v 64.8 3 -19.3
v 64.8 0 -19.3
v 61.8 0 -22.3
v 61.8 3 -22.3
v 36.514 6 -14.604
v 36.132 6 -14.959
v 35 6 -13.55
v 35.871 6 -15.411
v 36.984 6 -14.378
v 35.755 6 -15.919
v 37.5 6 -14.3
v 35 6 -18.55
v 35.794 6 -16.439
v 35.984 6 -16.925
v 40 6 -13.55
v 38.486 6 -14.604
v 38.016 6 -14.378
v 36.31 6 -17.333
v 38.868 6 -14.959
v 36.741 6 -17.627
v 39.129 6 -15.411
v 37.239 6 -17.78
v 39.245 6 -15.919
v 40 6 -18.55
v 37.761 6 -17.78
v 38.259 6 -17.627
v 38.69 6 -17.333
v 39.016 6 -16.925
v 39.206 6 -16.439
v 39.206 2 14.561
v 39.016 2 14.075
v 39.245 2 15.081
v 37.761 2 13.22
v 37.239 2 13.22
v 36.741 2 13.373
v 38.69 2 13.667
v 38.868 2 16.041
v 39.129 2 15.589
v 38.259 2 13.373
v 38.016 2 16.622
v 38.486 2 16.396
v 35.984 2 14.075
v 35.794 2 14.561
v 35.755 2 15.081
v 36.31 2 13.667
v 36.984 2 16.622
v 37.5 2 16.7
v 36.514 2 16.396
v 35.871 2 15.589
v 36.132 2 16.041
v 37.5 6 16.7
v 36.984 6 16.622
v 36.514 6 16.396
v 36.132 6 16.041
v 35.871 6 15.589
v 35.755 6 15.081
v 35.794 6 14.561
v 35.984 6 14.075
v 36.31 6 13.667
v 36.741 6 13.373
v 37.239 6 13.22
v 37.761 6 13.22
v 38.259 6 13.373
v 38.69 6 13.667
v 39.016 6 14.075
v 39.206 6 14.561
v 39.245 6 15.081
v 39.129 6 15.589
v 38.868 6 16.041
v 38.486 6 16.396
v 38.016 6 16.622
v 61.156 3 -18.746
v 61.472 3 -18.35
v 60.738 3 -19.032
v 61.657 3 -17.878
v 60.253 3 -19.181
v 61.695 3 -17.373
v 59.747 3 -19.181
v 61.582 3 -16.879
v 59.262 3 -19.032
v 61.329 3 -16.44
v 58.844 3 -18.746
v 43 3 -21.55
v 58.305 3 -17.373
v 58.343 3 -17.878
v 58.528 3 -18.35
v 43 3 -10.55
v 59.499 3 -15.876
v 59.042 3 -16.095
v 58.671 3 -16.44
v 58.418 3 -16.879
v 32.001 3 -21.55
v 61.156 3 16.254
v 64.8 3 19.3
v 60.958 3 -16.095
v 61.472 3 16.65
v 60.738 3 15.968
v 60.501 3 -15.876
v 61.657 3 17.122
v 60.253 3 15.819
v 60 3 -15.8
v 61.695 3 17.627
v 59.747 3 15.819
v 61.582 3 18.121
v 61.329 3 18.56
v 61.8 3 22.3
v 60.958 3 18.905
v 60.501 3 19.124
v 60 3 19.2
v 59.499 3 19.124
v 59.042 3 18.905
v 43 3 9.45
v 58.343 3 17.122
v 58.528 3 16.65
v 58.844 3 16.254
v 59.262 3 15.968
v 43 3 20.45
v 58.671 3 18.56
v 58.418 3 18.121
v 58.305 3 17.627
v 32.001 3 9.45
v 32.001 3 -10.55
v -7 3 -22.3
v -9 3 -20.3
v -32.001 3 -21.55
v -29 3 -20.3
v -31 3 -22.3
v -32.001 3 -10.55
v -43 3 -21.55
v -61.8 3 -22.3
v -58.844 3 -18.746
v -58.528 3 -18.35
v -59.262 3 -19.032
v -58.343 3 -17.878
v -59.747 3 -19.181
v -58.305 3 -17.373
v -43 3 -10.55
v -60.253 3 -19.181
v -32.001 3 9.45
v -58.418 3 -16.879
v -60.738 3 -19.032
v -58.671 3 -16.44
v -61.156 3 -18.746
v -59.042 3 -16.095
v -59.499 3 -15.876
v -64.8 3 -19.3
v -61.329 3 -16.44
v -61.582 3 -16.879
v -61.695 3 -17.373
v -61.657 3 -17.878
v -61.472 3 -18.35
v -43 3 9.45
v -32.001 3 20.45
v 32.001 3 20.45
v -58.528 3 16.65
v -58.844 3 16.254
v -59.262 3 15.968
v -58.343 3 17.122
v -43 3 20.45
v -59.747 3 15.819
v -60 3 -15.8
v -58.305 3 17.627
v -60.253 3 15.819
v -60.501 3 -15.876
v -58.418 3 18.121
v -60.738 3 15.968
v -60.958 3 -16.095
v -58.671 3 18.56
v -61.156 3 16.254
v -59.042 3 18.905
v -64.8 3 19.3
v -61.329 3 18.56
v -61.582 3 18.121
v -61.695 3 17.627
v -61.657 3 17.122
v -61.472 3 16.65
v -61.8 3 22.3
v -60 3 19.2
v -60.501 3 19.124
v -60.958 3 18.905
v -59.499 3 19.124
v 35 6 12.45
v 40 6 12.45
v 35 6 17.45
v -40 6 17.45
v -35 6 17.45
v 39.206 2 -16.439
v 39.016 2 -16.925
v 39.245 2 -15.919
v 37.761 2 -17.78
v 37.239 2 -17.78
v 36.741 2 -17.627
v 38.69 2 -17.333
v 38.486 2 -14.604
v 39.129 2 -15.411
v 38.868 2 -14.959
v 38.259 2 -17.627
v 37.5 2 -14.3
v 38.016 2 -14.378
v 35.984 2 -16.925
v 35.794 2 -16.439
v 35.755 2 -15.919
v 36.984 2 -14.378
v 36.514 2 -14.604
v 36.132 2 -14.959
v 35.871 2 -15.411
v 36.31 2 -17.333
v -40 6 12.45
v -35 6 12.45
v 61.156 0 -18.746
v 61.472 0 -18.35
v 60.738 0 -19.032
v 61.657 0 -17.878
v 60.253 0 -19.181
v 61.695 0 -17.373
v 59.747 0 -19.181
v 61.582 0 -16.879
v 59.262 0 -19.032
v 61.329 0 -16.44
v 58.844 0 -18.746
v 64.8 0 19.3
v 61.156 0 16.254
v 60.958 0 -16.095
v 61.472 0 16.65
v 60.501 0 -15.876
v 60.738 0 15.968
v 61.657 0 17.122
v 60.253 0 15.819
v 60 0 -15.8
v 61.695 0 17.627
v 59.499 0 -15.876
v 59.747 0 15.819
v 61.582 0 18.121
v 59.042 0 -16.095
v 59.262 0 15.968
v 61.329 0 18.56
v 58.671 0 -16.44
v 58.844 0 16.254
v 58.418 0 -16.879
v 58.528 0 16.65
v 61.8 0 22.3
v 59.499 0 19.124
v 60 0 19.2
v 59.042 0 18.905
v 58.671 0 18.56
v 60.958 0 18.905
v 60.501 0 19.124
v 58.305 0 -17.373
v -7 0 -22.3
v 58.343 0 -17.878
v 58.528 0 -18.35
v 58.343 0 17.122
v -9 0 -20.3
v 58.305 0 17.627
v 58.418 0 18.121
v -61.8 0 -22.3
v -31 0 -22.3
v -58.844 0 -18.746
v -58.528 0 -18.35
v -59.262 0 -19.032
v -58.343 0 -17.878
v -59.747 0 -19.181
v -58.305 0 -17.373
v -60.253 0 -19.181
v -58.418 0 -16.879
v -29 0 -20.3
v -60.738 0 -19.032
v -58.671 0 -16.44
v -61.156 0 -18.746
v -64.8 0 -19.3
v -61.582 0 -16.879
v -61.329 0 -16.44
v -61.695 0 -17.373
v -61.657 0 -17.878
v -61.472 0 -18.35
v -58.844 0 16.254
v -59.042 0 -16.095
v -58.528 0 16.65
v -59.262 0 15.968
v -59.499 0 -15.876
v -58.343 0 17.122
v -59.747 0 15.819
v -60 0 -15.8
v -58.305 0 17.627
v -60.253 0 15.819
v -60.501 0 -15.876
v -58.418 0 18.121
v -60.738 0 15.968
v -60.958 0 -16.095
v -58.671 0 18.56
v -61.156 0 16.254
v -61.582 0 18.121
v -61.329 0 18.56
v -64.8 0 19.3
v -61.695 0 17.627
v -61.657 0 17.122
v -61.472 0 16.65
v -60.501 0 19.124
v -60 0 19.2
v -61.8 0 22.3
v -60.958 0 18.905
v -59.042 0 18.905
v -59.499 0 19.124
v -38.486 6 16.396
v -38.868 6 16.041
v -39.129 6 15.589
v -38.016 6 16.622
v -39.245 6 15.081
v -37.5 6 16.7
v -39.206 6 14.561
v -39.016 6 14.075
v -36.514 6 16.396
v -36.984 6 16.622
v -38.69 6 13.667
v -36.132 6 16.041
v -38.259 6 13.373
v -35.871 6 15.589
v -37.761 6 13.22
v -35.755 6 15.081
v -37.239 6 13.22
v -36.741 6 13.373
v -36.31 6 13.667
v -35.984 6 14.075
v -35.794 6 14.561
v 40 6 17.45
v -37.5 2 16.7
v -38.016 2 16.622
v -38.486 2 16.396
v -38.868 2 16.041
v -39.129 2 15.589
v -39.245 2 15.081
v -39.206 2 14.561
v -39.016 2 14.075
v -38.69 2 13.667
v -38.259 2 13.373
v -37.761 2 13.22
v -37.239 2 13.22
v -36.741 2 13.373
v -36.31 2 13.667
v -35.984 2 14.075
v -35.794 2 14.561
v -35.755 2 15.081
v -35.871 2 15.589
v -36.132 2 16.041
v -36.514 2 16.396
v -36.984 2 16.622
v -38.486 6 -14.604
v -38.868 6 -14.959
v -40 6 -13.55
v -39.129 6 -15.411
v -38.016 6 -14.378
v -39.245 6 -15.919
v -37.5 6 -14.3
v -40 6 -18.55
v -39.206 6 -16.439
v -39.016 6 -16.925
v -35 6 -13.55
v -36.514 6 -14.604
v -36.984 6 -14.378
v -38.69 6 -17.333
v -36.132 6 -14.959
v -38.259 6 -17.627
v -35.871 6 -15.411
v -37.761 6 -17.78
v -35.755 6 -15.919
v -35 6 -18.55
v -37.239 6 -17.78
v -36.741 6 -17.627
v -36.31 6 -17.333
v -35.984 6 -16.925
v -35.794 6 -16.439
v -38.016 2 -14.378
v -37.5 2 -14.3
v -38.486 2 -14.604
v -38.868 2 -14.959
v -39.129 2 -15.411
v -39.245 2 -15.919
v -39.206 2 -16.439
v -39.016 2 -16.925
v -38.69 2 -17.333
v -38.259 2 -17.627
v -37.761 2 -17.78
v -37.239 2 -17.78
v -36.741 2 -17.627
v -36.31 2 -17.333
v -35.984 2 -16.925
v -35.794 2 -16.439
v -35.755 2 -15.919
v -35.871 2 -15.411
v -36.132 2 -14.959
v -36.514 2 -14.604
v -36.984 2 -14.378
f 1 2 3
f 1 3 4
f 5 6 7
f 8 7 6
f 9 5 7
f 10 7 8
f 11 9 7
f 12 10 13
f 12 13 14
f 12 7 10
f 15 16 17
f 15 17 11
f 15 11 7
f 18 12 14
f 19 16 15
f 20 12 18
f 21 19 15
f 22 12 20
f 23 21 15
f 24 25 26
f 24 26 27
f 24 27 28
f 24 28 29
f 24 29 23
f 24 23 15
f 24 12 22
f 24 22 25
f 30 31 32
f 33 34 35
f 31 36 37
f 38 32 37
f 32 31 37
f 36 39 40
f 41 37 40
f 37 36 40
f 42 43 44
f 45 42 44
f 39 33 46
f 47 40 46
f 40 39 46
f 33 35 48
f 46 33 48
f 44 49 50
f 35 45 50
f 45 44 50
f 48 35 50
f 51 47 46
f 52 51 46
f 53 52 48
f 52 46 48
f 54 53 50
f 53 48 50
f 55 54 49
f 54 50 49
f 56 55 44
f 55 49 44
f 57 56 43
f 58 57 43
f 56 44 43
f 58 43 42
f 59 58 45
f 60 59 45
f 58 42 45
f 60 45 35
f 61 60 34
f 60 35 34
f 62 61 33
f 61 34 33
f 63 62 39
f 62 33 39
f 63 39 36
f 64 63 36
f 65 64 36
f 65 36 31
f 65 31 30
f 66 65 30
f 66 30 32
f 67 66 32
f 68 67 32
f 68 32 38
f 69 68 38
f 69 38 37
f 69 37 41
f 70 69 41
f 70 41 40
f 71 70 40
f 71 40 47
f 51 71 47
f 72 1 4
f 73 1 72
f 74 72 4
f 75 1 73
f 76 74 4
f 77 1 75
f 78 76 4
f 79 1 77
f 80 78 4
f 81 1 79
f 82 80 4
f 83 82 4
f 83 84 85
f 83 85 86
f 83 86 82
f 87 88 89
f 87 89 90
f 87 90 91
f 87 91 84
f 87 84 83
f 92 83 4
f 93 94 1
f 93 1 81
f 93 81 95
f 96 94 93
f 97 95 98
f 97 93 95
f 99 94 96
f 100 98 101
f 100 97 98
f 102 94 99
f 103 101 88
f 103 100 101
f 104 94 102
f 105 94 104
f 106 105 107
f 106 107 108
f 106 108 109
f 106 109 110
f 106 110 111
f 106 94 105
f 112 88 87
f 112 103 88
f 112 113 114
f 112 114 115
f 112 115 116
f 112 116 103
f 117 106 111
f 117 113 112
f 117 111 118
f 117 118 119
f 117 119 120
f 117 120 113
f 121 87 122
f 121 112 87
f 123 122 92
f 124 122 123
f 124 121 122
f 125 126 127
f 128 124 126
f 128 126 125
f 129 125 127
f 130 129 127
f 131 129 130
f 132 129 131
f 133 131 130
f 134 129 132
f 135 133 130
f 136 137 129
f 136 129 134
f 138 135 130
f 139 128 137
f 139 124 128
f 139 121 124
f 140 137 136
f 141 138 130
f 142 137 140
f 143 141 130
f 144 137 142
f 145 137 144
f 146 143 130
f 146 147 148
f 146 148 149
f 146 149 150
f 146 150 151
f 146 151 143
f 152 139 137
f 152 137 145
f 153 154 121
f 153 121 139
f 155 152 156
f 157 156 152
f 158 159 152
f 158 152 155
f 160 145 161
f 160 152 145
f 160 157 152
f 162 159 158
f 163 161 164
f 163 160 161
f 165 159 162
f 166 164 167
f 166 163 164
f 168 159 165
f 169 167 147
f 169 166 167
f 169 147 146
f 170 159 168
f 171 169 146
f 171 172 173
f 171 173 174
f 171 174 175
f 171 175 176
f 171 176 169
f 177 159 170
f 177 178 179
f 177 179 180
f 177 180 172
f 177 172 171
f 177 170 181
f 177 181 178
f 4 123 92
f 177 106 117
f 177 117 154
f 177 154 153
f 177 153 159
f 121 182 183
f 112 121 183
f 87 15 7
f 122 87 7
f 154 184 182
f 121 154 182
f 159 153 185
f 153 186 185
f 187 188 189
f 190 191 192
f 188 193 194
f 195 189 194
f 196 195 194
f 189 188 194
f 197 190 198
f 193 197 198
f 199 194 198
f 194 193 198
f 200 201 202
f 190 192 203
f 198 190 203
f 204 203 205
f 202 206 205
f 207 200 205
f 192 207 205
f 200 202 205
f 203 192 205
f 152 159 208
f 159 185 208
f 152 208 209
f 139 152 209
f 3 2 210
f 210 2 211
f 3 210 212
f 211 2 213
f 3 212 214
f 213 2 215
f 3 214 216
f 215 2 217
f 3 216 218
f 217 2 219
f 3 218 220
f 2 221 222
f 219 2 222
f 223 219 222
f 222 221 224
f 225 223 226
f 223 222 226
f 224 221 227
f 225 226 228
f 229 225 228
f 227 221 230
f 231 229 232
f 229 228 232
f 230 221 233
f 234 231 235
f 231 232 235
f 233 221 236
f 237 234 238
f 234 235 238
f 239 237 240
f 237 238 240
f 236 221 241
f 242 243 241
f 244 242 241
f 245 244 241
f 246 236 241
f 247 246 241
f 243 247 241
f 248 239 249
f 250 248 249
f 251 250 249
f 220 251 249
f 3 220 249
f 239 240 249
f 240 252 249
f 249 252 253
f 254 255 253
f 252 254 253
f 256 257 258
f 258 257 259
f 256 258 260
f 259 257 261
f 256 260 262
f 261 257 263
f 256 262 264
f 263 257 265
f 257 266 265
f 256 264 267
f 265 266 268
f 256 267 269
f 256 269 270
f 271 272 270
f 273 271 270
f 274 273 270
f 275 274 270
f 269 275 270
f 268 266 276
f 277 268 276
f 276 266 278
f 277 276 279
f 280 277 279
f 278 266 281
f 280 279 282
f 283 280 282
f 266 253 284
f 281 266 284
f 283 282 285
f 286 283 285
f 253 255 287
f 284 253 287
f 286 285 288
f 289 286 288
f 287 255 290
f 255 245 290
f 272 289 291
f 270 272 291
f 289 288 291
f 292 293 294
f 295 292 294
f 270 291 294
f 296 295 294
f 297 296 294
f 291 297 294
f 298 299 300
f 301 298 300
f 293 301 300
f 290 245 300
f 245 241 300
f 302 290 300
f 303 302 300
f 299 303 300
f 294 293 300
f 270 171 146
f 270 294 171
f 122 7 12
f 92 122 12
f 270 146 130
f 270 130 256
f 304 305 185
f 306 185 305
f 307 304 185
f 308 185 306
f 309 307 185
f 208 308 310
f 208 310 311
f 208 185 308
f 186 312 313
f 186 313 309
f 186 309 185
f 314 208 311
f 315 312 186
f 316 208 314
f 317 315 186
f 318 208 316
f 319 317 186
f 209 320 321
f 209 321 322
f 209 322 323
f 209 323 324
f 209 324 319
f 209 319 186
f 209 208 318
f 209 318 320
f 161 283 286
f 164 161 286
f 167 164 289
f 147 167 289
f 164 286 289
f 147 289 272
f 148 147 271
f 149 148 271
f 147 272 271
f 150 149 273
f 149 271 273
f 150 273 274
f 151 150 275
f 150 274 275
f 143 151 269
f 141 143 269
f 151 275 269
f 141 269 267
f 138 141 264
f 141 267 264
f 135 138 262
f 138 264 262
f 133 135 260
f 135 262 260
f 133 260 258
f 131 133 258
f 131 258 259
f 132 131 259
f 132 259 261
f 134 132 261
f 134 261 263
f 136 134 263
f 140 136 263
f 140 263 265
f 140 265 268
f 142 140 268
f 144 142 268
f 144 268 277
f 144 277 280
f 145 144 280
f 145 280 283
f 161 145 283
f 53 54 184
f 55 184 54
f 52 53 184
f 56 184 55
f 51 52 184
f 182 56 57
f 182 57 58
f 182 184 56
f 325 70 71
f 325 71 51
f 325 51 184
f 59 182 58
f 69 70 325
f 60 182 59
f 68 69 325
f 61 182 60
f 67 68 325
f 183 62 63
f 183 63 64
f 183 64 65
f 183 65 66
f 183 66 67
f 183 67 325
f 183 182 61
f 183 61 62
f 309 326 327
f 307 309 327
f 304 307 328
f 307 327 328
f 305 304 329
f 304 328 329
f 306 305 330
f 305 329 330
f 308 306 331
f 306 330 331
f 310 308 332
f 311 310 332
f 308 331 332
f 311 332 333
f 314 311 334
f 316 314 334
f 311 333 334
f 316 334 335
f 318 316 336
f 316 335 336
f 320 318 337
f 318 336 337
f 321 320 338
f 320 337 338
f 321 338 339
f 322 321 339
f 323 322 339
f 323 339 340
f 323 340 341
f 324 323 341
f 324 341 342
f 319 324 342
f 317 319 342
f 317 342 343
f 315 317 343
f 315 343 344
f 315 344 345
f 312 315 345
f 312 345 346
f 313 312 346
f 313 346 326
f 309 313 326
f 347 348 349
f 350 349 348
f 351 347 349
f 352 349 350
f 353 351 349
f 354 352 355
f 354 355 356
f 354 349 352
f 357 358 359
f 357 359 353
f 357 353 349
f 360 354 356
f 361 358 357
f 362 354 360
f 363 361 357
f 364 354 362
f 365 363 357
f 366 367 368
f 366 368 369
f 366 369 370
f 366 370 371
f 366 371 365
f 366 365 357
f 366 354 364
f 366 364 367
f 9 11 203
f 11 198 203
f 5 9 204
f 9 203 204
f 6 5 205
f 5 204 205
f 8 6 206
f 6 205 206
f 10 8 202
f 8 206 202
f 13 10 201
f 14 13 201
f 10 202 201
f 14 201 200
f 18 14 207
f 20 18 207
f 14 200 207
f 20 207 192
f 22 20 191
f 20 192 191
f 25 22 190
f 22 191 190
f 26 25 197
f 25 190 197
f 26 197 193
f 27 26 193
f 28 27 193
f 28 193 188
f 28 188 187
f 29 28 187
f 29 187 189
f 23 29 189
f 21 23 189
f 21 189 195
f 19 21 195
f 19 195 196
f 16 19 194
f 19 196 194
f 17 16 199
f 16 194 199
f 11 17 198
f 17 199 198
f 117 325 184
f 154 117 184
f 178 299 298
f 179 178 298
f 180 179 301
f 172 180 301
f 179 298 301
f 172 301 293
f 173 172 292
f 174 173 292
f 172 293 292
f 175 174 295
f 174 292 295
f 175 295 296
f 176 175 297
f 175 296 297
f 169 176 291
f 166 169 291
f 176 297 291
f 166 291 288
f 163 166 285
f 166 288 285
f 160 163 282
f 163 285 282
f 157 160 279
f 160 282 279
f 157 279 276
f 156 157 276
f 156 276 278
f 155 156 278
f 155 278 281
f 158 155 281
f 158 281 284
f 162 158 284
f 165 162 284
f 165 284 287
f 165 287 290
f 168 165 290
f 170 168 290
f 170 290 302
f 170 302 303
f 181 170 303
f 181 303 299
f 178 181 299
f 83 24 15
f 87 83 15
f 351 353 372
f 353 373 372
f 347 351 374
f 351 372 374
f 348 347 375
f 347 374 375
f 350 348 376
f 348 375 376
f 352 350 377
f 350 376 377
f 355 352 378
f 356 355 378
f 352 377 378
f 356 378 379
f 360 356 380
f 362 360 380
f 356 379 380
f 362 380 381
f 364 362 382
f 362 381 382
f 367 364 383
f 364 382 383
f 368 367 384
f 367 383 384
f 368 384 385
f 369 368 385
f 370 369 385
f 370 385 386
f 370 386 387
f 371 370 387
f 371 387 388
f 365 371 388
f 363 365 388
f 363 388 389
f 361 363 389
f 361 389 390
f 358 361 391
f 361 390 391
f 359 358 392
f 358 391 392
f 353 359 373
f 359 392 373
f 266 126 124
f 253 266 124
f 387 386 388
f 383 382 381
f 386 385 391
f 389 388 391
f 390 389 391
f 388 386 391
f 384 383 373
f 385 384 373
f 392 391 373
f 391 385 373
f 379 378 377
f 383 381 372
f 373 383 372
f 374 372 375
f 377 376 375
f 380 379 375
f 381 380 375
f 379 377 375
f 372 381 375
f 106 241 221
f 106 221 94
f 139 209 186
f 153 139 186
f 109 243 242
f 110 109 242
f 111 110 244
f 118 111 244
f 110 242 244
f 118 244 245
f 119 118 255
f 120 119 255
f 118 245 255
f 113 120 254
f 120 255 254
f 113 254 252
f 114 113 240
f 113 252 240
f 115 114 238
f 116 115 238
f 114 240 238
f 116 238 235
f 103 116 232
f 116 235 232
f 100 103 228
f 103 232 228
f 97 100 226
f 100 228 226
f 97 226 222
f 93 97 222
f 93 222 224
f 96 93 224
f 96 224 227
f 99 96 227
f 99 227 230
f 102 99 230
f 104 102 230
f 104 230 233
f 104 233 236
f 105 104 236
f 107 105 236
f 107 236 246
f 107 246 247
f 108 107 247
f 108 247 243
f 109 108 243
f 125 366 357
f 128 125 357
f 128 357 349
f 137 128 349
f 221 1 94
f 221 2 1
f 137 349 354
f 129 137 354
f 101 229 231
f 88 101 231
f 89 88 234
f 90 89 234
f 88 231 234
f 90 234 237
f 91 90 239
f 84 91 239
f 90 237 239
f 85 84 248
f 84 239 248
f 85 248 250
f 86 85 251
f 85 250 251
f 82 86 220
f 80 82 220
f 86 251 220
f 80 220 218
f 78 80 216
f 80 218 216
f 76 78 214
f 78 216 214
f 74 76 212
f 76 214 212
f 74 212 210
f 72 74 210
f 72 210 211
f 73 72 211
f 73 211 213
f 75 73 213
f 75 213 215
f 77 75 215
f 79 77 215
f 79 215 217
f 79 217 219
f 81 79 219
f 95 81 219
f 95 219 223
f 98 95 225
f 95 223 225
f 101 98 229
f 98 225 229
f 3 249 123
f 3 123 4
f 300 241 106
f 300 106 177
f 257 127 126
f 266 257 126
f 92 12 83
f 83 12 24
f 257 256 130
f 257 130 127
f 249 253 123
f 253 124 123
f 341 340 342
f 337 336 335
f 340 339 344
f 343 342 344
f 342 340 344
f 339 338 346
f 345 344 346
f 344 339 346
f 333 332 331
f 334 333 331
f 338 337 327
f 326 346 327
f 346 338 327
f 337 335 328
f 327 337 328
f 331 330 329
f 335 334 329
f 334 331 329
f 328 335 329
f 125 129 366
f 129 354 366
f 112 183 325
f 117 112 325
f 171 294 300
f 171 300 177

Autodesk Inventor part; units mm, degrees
ref_plane "YZ Plane" through (0, 0, 0) normal (1, 0, 0) x (0, 1, 0)
ref_plane "XZ Plane" through (0, 0, 0) normal (0, 1, 0) x (-1, 0, 0)
ref_plane "XY Plane" through (0, 0, 0) normal (0, 0, 1) x (1, 0, 0)
sketch "Sketch1" plane through (0, 0, 0) normal (0, 1, 0) x (-1, 0, 0)
  line L0 (64.8, -22.3) -> (-64.8, -22.3)
  line L1 (-64.8, -22.3) -> (-64.8, 22.3)
  line L2 (-64.8, 22.3) -> (64.8, 22.3)
  line L3 (64.8, 22.3) -> (64.8, -22.3)
  point P0 (0, 0)
  point P1 (64.8, 0)
  point P2 (0, -22.3)
  dimension "d0" = 129.6
  dimension "d1" = 44.6
extrude "Extrusion1" add sketch "Sketch1" along normal blind 3
sketch "Sketch2" plane through (0, 3, 0) normal (0, 1, 0) x (1, 0, 0)
  line L0 (-64.8, -22.3) -> (64.8, -22.3) construction
  line L1 (64.8, -22.3) -> (64.8, 22.3) construction
  line L2 (64.8, 22.3) -> (-64.8, 22.3) construction
  line L3 (-64.8, 22.3) -> (-64.8, -22.3) construction
  line L4 (-40, 18.55) -> (40, 18.55) construction
  line L5 (40, 18.55) -> (40, -17.45) construction
  line L6 (40, -17.45) -> (-40, -17.45) construction
  line L7 (-40, -17.45) -> (-40, 18.55) construction
  circle A0 centre (-37.5, 16.05) radius 1.25 construction
  circle A1 centre (37.5, 16.05) radius 1.25 construction
  circle A2 centre (37.5, -14.95) radius 1.25 construction
  circle A3 centre (-37.5, -14.95) radius 1.25 construction
  line L8 (-37.5, 12.5) -> (37.5, 12.5) construction
  line L9 (37.5, 12.5) -> (37.5, -12.5) construction
  line L10 (37.5, -12.5) -> (-37.5, -12.5) construction
  line L11 (-37.5, -12.5) -> (-37.5, 12.5) construction
  line L12 (-40, 18.55) -> (-35, 18.55)
  line L13 (-35, 18.55) -> (-35, 13.55)
  line L14 (-35, 13.55) -> (-40, 13.55)
  line L15 (-40, 13.55) -> (-40, 18.55)
  line L16 (-40, 18.55) -> (-35, 13.55) construction
  line L17 (-35, 18.55) -> (-40, 13.55) construction
  line L18 (35, 18.55) -> (40, 18.55)
  line L19 (40, 18.55) -> (40, 13.55)
  line L20 (40, 13.55) -> (35, 13.55)
  line L21 (35, 13.55) -> (35, 18.55)
  line L22 (35, 18.55) -> (40, 13.55) construction
  line L23 (40, 18.55) -> (35, 13.55) construction
  line L24 (35, -12.45) -> (40, -12.45)
  line L25 (40, -12.45) -> (40, -17.45)
  line L26 (40, -17.45) -> (35, -17.45)
  line L27 (35, -17.45) -> (35, -12.45)
  line L28 (35, -12.45) -> (40, -17.45) construction
  line L29 (40, -12.45) -> (35, -17.45) construction
  line L30 (-40, -12.45) -> (-35, -12.45)
  line L31 (-35, -12.45) -> (-35, -17.45)
  line L32 (-35, -17.45) -> (-40, -17.45)
  line L33 (-40, -17.45) -> (-40, -12.45)
  line L34 (-40, -12.45) -> (-35, -17.45) construction
  line L35 (-35, -12.45) -> (-40, -17.45) construction
  point P0 (0, 0)
  point P1 (0, 12.5)
  point P2 (0, 22.3)
  dimension "d4" = 80
  dimension "d5" = 36
  dimension "d6" = 2.5
  dimension "d7" = 2.5
  dimension "d8" = 2.5
  dimension "d9" = 2.5
  dimension "d10" = 2.5
  dimension "d12" = 75
  dimension "d13" = 25
  dimension "d14" = 2.5
  dimension "d15" = 4.95
  dimension "d16" = 9.8
  dimension "d17" = 5
extrude "Extrusion2" add sketch "Sketch2" along normal blind 3
sketch "Sketch3" plane through (0, 6, 0) normal (0, 1, 0) x (1, 0, 0)
  line L0 (-35, 18.55) -> (-40, 13.55) construction
  point P0 (0, 0)
  point P1 (-37.5, -14.95)
  point P2 (-37.5, 16.05)
  point P3 (37.5, 16.05)
  point P4 (37.5, -14.95)
hole "Hole1" at (-37.5, 6, 14.95) at (-37.5, 6, -16.05) at (37.5, 6, -16.05) at (37.5, 6, 14.95) direction (0, -1, 0) diameter 3.5 depth 4
chamfer "Chamfer1" distance 3 angle 45 16 edges at (-37.5, 3, -13.55) (-40, 3, -16.05) (-37.5, 3, -18.55) (-35, 3, -16.05) (-37.5, 3, 12.45) (-40, 3, 14.95) (-37.5, 3, 17.45) (-35, 3, 14.95) (37.5, 3, -13.55) (35, 3, -16.05) (37.5, 3, -18.55) (40, 3, -16.05) (37.5, 3, 12.45) (35, 3, 14.95) (37.5, 3, 17.45) (40, 3, 14.95)
sketch "Sketch4" plane through (0, 3, 0) normal (0, 1, 0) x (1, 0, 0)
  line L0 (43, 10.55) -> (43, 21.55) construction
  line L1 (32, 10.55) -> (43, 10.55) construction
  line L2 (32, 21.55) -> (32, 10.55) construction
  line L3 (43, 21.55) -> (32, 21.55) construction
  line L4 (-32, 10.55) -> (-32, 21.55) construction
  line L5 (-43, 10.55) -> (-32, 10.55) construction
  line L6 (-43, 21.55) -> (-43, 10.55) construction
  line L7 (-32, 21.55) -> (-43, 21.55) construction
  line L8 (-64.8, -22.3) -> (64.8, -22.3) construction
  line L9 (64.8, -22.3) -> (64.8, 22.3) construction
  line L10 (64.8, 22.3) -> (-64.8, 22.3) construction
  line L11 (-64.8, 22.3) -> (-64.8, -22.3) construction
  line L12 (-43, -9.45) -> (-43, -20.45) construction
  line L13 (-32, -9.45) -> (-43, -9.45) construction
  line L14 (-32, -20.45) -> (-32, -9.45) construction
  line L15 (-43, -20.45) -> (-32, -20.45) construction
  line L16 (32, -9.45) -> (32, -20.45) construction
  line L17 (43, -9.45) -> (32, -9.45) construction
  line L18 (43, -20.45) -> (43, -9.45) construction
  line L19 (32, -20.45) -> (43, -20.45) construction
  line L20 (64.8, 22.3) -> (-64.8, 22.3) construction
  line L21 (-31, 22.3) -> (-29, 20.3)
  line L22 (-29, 20.3) -> (-9, 20.3)
  line L23 (-9, 20.3) -> (-7, 22.3)
  line L24 (-31, 22.3) -> (-7, 22.3)
  point P0 (0, 0)
  dimension "d31" = 2
  dimension "d32" = 20
  dimension "d33" = 135
  dimension "d34" = 135
  dimension "d35" = 1
extrude "Extrusion3" cut sketch "Sketch4" against normal blind 3
chamfer "Chamfer2" distance 3 angle 45 4 edges at (-64.8, 1.5, -22.3) (-64.8, 1.5, 22.3) (64.8, 1.5, 22.3) (64.8, 1.5, -22.3)
sketch "Sketch5" plane through (0, 3, 0) normal (0, 1, 0) x (1, 0, 0)
  line L0 (43, 10.55) -> (43, 21.55) construction
  line L1 (32, 10.55) -> (43, 10.55) construction
  line L2 (32, 21.55) -> (32, 10.55) construction
  line L3 (43, 21.55) -> (32, 21.55) construction
  line L4 (-32, 10.55) -> (-32, 21.55) construction
  line L5 (-43, 10.55) -> (-32, 10.55) construction
  line L6 (-43, 21.55) -> (-43, 10.55) construction
  line L7 (-32, 21.55) -> (-43, 21.55) construction
  line L8 (-43, -9.45) -> (-43, -20.45) construction
  line L9 (-32, -9.45) -> (-43, -9.45) construction
  line L10 (-32, -20.45) -> (-32, -9.45) construction
  line L11 (-43, -20.45) -> (-32, -20.45) construction
  line L12 (32, -9.45) -> (32, -20.45) construction
  line L13 (43, -9.45) -> (32, -9.45) construction
  line L14 (43, -20.45) -> (43, -9.45) construction
  line L15 (32, -20.45) -> (43, -20.45) construction
  line L16 (61.8, 22.3) -> (64.8, 19.3) construction
  line L17 (61.8, 22.3) -> (-7, 22.3) construction
  line L18 (-7, 22.3) -> (-9, 20.3) construction
  line L19 (-9, 20.3) -> (-29, 20.3) construction
  line L20 (-29, 20.3) -> (-31, 22.3) construction
  line L21 (-31, 22.3) -> (-61.8, 22.3) construction
  line L22 (-64.8, 19.3) -> (-61.8, 22.3) construction
  line L23 (-64.8, 19.3) -> (-64.8, -19.3) construction
  line L24 (-61.8, -22.3) -> (-64.8, -19.3) construction
  line L25 (-61.8, -22.3) -> (61.8, -22.3) construction
  line L26 (64.8, -19.3) -> (61.8, -22.3) construction
  line L27 (64.8, -19.3) -> (64.8, 19.3) construction
  point P0 (0, 0)
  point P1 (-60, 17.5)
  point P2 (-60, -17.5)
  point P3 (60, -17.5)
  point P4 (60, 17.5)
  dimension "d49" = 4.8
  dimension "d50" = 4.8
  dimension "d51" = 4.8
  dimension "d52" = 4.8
hole "Hole2" at (-60, 3, -17.5) at (-60, 3, 17.5) at (60, 3, 17.5) at (60, 3, -17.5) direction (0, -1, 0) diameter 3.4 depth 4 clearance for "Hex Head Cap Screw ISO 24017" size "M3" standard "ISO"
equation "\"d8\" = d7"
equation "\"d9\" = d7"
equation "\"d10\" = d7"
equation "\"d34\" = d33"
equation "\"d49\" = d50"
equation "\"d51\" = d50"
equation "\"d52\" = d50"
properties part number "VFD_Mount"
